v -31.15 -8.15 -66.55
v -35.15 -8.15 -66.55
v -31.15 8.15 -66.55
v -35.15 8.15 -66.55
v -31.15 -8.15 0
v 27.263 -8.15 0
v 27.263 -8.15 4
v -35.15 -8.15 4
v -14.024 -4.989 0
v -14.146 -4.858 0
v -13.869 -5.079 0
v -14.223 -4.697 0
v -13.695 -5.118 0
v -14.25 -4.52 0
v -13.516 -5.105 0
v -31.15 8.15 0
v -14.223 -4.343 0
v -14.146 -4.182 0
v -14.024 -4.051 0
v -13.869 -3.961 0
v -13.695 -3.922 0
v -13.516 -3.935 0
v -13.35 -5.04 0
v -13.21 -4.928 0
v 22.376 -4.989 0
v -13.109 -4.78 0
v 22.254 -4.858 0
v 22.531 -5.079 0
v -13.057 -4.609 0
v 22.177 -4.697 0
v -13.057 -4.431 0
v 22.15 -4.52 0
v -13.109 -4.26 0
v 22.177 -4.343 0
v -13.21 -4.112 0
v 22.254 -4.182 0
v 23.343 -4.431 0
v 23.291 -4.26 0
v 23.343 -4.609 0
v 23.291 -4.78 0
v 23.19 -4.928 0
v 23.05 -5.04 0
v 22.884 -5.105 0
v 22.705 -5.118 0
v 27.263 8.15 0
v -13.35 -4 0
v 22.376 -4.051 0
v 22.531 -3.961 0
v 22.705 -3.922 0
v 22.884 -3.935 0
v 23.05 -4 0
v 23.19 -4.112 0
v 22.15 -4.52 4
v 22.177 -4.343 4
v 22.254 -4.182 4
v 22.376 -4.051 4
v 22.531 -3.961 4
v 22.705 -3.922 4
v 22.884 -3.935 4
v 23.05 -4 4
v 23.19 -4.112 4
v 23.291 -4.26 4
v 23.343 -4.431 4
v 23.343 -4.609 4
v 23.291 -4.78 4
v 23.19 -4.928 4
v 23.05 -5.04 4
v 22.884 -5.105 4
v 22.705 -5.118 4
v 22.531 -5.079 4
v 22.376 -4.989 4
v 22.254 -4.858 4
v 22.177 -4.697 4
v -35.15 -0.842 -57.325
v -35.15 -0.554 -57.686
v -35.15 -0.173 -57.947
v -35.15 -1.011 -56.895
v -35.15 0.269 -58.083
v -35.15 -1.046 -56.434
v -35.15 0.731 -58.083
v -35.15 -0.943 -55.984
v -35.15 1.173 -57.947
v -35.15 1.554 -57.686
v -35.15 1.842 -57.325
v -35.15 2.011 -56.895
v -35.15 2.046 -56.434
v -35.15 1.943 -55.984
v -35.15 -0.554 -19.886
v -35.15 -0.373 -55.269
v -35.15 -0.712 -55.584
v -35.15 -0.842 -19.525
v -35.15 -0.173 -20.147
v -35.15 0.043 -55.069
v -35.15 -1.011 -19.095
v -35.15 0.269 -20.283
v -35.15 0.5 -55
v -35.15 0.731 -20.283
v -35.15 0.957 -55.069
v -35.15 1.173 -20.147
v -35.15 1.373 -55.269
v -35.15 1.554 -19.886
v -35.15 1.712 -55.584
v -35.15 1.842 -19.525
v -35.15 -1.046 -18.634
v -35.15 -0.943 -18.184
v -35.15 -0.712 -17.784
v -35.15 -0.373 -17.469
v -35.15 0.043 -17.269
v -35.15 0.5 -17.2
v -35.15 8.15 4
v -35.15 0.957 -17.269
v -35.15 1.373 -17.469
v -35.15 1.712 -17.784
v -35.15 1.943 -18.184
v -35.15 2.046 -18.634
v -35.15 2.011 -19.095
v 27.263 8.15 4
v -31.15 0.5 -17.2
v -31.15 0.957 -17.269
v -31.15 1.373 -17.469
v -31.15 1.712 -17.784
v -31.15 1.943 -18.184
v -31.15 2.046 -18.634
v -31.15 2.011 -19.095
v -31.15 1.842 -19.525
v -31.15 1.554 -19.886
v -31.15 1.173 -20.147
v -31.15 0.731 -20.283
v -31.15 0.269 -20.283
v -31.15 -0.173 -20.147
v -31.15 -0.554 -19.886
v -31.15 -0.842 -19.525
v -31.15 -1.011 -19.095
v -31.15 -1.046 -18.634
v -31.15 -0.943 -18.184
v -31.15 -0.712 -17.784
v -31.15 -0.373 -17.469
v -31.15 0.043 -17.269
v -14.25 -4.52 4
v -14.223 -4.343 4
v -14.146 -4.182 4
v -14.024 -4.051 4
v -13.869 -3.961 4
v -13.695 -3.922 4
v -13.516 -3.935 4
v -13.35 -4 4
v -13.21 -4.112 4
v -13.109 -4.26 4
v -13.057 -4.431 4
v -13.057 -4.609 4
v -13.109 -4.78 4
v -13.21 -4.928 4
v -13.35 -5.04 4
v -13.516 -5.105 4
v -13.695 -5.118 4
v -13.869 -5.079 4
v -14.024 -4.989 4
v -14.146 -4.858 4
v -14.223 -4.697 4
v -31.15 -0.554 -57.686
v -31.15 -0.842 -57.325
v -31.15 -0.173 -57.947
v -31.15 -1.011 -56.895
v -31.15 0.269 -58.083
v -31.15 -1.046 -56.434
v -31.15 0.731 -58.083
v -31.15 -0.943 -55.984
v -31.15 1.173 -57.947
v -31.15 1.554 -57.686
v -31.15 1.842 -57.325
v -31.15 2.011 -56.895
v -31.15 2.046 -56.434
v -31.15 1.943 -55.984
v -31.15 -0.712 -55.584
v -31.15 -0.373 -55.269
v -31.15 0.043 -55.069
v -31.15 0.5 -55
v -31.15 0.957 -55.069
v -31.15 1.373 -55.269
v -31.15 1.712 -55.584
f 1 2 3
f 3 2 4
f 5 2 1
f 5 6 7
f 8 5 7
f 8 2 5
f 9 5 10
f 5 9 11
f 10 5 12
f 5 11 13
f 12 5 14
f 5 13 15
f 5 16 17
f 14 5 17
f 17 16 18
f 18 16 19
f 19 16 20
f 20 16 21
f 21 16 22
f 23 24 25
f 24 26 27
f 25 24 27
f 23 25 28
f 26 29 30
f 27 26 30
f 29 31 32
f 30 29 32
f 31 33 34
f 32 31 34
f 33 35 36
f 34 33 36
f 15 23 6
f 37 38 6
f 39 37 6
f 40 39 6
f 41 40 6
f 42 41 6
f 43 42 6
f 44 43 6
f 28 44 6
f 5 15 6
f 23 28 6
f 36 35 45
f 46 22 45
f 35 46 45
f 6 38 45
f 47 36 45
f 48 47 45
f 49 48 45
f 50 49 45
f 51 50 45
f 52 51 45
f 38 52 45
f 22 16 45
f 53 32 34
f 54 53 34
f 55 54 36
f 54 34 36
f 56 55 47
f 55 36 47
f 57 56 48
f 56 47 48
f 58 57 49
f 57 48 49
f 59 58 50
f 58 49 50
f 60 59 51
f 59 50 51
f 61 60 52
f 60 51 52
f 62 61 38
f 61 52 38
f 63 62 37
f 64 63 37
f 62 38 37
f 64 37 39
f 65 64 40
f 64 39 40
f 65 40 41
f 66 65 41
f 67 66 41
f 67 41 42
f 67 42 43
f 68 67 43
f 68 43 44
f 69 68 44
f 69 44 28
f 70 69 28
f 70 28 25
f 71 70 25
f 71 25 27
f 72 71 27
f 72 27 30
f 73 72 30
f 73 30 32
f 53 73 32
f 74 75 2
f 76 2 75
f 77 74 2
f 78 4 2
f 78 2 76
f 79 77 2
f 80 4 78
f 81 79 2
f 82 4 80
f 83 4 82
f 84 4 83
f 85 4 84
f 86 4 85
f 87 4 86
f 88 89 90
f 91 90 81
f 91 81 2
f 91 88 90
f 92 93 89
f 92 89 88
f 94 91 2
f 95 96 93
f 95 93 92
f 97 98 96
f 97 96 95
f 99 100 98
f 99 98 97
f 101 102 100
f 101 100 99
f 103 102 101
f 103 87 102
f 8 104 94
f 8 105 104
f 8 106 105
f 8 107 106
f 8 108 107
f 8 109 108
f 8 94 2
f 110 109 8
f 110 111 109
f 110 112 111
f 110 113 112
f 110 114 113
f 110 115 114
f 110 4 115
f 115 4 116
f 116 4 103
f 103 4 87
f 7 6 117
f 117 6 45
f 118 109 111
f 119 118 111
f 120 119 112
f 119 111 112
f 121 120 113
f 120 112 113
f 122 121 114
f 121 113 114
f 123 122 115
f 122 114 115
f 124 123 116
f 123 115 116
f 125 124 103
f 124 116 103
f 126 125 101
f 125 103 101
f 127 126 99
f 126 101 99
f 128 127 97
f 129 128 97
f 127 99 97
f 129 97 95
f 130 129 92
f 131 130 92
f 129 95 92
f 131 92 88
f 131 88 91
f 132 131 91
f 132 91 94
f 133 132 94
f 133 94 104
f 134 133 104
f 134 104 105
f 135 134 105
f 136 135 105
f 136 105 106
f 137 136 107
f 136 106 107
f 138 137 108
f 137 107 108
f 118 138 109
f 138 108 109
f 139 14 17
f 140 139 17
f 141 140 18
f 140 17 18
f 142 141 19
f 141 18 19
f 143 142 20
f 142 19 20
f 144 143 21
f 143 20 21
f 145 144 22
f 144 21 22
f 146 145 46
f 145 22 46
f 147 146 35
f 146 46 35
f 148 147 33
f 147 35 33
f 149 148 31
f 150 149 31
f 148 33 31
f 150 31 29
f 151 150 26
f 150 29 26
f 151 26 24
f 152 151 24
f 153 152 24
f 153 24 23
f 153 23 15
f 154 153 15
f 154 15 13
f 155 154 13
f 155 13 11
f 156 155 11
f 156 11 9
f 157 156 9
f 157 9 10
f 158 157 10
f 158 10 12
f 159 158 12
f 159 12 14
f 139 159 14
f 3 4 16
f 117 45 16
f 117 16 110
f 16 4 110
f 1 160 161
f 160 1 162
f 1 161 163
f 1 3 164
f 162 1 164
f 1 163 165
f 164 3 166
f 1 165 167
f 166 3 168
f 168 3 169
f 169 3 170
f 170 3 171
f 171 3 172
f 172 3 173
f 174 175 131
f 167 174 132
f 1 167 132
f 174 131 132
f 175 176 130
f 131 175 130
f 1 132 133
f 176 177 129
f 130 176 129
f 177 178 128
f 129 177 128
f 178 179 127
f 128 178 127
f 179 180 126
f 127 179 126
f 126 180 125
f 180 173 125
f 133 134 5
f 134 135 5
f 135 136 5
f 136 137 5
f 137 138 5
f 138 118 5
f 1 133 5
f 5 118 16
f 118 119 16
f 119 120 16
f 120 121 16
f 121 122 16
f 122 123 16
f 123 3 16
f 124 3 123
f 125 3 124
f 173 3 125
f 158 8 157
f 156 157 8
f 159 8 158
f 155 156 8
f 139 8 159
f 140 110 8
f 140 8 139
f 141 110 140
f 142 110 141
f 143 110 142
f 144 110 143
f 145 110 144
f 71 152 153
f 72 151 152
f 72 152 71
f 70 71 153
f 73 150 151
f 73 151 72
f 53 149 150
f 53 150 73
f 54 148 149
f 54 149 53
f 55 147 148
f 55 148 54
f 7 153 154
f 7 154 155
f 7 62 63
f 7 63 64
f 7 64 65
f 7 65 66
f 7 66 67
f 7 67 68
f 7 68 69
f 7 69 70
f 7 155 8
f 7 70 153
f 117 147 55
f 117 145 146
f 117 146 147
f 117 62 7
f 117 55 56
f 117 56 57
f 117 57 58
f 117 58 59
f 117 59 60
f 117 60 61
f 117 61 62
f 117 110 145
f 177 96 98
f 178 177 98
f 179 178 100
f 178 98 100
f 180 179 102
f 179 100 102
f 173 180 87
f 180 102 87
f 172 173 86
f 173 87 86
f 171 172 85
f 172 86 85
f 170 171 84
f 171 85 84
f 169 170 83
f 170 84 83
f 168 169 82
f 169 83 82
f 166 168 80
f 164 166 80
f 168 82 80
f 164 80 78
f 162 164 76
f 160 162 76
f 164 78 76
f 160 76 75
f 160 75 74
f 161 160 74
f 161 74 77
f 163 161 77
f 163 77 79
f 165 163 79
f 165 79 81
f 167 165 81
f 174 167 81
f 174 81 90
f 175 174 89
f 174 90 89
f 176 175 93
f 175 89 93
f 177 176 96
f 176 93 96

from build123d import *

# Parameters (mm, degrees)
SKETCH_1_W          = 62.4134
SKETCH_1_H          = 16.3
EXTRUDE_1_DEPTH     = 4
SKETCH_3_W          = 70.55
SKETCH_3_H          = 16.3
SKETCH_3_R          = 1.55
EXTRUDE_3_DEPTH     = 4
CUT_EXTRUDE_1_REACH = 77.702
SKETCH_4_R          = 0.6


with BuildPart() as part:
    # 草图1 → 凸台-拉伸1 (new body)
    with BuildSketch(Plane.XY):
        with Locations((-3.9433, 0)):
            Rectangle(SKETCH_1_W, SKETCH_1_H)
    extrude(amount=EXTRUDE_1_DEPTH)

    # 草图3 → 凸台-拉伸3 (add)
    with BuildSketch(Plane.ZY.offset(35.15)):
        with Locations((-31.275, 0)):
            Rectangle(SKETCH_3_W, SKETCH_3_H)
        with Locations((-56.55, 0.5)):
            Circle(SKETCH_3_R, mode=Mode.SUBTRACT)
        with Locations((-18.75, 0.5)):
            Circle(SKETCH_3_R, mode=Mode.SUBTRACT)
    extrude(amount=-EXTRUDE_3_DEPTH)

    # 草图4 → 切除-拉伸1 (cut, up to next)
    with BuildSketch(Plane(origin=(0, 0, 0), x_dir=(-1, 0, 0), z_dir=(0, 0, -1)), mode=Mode.PRIVATE) as cut_extrude_1_sk1:
        with Locations((-22.75, -4.52)):
            Circle(SKETCH_4_R)
    cut_extrude_1_tool1 = extrude(cut_extrude_1_sk1.sketch, amount=-CUT_EXTRUDE_1_REACH, mode=Mode.PRIVATE) & part.part
    # 草图4 → 切除-拉伸1 (cut, up to next)
    with BuildSketch(Plane(origin=(0, 0, 0), x_dir=(-1, 0, 0), z_dir=(0, 0, -1)), mode=Mode.PRIVATE) as cut_extrude_1_sk2:
        with Locations((13.65, -4.52)):
            Circle(SKETCH_4_R)
    cut_extrude_1_tool2 = extrude(cut_extrude_1_sk2.sketch, amount=-CUT_EXTRUDE_1_REACH, mode=Mode.PRIVATE) & part.part
    add(cut_extrude_1_tool1.solids().sort_by_distance((22.75, -4.52, 0))[0], mode=Mode.SUBTRACT)
    add(cut_extrude_1_tool2.solids().sort_by_distance((-13.65, -4.52, 0))[0], mode=Mode.SUBTRACT)


solid = part.part
